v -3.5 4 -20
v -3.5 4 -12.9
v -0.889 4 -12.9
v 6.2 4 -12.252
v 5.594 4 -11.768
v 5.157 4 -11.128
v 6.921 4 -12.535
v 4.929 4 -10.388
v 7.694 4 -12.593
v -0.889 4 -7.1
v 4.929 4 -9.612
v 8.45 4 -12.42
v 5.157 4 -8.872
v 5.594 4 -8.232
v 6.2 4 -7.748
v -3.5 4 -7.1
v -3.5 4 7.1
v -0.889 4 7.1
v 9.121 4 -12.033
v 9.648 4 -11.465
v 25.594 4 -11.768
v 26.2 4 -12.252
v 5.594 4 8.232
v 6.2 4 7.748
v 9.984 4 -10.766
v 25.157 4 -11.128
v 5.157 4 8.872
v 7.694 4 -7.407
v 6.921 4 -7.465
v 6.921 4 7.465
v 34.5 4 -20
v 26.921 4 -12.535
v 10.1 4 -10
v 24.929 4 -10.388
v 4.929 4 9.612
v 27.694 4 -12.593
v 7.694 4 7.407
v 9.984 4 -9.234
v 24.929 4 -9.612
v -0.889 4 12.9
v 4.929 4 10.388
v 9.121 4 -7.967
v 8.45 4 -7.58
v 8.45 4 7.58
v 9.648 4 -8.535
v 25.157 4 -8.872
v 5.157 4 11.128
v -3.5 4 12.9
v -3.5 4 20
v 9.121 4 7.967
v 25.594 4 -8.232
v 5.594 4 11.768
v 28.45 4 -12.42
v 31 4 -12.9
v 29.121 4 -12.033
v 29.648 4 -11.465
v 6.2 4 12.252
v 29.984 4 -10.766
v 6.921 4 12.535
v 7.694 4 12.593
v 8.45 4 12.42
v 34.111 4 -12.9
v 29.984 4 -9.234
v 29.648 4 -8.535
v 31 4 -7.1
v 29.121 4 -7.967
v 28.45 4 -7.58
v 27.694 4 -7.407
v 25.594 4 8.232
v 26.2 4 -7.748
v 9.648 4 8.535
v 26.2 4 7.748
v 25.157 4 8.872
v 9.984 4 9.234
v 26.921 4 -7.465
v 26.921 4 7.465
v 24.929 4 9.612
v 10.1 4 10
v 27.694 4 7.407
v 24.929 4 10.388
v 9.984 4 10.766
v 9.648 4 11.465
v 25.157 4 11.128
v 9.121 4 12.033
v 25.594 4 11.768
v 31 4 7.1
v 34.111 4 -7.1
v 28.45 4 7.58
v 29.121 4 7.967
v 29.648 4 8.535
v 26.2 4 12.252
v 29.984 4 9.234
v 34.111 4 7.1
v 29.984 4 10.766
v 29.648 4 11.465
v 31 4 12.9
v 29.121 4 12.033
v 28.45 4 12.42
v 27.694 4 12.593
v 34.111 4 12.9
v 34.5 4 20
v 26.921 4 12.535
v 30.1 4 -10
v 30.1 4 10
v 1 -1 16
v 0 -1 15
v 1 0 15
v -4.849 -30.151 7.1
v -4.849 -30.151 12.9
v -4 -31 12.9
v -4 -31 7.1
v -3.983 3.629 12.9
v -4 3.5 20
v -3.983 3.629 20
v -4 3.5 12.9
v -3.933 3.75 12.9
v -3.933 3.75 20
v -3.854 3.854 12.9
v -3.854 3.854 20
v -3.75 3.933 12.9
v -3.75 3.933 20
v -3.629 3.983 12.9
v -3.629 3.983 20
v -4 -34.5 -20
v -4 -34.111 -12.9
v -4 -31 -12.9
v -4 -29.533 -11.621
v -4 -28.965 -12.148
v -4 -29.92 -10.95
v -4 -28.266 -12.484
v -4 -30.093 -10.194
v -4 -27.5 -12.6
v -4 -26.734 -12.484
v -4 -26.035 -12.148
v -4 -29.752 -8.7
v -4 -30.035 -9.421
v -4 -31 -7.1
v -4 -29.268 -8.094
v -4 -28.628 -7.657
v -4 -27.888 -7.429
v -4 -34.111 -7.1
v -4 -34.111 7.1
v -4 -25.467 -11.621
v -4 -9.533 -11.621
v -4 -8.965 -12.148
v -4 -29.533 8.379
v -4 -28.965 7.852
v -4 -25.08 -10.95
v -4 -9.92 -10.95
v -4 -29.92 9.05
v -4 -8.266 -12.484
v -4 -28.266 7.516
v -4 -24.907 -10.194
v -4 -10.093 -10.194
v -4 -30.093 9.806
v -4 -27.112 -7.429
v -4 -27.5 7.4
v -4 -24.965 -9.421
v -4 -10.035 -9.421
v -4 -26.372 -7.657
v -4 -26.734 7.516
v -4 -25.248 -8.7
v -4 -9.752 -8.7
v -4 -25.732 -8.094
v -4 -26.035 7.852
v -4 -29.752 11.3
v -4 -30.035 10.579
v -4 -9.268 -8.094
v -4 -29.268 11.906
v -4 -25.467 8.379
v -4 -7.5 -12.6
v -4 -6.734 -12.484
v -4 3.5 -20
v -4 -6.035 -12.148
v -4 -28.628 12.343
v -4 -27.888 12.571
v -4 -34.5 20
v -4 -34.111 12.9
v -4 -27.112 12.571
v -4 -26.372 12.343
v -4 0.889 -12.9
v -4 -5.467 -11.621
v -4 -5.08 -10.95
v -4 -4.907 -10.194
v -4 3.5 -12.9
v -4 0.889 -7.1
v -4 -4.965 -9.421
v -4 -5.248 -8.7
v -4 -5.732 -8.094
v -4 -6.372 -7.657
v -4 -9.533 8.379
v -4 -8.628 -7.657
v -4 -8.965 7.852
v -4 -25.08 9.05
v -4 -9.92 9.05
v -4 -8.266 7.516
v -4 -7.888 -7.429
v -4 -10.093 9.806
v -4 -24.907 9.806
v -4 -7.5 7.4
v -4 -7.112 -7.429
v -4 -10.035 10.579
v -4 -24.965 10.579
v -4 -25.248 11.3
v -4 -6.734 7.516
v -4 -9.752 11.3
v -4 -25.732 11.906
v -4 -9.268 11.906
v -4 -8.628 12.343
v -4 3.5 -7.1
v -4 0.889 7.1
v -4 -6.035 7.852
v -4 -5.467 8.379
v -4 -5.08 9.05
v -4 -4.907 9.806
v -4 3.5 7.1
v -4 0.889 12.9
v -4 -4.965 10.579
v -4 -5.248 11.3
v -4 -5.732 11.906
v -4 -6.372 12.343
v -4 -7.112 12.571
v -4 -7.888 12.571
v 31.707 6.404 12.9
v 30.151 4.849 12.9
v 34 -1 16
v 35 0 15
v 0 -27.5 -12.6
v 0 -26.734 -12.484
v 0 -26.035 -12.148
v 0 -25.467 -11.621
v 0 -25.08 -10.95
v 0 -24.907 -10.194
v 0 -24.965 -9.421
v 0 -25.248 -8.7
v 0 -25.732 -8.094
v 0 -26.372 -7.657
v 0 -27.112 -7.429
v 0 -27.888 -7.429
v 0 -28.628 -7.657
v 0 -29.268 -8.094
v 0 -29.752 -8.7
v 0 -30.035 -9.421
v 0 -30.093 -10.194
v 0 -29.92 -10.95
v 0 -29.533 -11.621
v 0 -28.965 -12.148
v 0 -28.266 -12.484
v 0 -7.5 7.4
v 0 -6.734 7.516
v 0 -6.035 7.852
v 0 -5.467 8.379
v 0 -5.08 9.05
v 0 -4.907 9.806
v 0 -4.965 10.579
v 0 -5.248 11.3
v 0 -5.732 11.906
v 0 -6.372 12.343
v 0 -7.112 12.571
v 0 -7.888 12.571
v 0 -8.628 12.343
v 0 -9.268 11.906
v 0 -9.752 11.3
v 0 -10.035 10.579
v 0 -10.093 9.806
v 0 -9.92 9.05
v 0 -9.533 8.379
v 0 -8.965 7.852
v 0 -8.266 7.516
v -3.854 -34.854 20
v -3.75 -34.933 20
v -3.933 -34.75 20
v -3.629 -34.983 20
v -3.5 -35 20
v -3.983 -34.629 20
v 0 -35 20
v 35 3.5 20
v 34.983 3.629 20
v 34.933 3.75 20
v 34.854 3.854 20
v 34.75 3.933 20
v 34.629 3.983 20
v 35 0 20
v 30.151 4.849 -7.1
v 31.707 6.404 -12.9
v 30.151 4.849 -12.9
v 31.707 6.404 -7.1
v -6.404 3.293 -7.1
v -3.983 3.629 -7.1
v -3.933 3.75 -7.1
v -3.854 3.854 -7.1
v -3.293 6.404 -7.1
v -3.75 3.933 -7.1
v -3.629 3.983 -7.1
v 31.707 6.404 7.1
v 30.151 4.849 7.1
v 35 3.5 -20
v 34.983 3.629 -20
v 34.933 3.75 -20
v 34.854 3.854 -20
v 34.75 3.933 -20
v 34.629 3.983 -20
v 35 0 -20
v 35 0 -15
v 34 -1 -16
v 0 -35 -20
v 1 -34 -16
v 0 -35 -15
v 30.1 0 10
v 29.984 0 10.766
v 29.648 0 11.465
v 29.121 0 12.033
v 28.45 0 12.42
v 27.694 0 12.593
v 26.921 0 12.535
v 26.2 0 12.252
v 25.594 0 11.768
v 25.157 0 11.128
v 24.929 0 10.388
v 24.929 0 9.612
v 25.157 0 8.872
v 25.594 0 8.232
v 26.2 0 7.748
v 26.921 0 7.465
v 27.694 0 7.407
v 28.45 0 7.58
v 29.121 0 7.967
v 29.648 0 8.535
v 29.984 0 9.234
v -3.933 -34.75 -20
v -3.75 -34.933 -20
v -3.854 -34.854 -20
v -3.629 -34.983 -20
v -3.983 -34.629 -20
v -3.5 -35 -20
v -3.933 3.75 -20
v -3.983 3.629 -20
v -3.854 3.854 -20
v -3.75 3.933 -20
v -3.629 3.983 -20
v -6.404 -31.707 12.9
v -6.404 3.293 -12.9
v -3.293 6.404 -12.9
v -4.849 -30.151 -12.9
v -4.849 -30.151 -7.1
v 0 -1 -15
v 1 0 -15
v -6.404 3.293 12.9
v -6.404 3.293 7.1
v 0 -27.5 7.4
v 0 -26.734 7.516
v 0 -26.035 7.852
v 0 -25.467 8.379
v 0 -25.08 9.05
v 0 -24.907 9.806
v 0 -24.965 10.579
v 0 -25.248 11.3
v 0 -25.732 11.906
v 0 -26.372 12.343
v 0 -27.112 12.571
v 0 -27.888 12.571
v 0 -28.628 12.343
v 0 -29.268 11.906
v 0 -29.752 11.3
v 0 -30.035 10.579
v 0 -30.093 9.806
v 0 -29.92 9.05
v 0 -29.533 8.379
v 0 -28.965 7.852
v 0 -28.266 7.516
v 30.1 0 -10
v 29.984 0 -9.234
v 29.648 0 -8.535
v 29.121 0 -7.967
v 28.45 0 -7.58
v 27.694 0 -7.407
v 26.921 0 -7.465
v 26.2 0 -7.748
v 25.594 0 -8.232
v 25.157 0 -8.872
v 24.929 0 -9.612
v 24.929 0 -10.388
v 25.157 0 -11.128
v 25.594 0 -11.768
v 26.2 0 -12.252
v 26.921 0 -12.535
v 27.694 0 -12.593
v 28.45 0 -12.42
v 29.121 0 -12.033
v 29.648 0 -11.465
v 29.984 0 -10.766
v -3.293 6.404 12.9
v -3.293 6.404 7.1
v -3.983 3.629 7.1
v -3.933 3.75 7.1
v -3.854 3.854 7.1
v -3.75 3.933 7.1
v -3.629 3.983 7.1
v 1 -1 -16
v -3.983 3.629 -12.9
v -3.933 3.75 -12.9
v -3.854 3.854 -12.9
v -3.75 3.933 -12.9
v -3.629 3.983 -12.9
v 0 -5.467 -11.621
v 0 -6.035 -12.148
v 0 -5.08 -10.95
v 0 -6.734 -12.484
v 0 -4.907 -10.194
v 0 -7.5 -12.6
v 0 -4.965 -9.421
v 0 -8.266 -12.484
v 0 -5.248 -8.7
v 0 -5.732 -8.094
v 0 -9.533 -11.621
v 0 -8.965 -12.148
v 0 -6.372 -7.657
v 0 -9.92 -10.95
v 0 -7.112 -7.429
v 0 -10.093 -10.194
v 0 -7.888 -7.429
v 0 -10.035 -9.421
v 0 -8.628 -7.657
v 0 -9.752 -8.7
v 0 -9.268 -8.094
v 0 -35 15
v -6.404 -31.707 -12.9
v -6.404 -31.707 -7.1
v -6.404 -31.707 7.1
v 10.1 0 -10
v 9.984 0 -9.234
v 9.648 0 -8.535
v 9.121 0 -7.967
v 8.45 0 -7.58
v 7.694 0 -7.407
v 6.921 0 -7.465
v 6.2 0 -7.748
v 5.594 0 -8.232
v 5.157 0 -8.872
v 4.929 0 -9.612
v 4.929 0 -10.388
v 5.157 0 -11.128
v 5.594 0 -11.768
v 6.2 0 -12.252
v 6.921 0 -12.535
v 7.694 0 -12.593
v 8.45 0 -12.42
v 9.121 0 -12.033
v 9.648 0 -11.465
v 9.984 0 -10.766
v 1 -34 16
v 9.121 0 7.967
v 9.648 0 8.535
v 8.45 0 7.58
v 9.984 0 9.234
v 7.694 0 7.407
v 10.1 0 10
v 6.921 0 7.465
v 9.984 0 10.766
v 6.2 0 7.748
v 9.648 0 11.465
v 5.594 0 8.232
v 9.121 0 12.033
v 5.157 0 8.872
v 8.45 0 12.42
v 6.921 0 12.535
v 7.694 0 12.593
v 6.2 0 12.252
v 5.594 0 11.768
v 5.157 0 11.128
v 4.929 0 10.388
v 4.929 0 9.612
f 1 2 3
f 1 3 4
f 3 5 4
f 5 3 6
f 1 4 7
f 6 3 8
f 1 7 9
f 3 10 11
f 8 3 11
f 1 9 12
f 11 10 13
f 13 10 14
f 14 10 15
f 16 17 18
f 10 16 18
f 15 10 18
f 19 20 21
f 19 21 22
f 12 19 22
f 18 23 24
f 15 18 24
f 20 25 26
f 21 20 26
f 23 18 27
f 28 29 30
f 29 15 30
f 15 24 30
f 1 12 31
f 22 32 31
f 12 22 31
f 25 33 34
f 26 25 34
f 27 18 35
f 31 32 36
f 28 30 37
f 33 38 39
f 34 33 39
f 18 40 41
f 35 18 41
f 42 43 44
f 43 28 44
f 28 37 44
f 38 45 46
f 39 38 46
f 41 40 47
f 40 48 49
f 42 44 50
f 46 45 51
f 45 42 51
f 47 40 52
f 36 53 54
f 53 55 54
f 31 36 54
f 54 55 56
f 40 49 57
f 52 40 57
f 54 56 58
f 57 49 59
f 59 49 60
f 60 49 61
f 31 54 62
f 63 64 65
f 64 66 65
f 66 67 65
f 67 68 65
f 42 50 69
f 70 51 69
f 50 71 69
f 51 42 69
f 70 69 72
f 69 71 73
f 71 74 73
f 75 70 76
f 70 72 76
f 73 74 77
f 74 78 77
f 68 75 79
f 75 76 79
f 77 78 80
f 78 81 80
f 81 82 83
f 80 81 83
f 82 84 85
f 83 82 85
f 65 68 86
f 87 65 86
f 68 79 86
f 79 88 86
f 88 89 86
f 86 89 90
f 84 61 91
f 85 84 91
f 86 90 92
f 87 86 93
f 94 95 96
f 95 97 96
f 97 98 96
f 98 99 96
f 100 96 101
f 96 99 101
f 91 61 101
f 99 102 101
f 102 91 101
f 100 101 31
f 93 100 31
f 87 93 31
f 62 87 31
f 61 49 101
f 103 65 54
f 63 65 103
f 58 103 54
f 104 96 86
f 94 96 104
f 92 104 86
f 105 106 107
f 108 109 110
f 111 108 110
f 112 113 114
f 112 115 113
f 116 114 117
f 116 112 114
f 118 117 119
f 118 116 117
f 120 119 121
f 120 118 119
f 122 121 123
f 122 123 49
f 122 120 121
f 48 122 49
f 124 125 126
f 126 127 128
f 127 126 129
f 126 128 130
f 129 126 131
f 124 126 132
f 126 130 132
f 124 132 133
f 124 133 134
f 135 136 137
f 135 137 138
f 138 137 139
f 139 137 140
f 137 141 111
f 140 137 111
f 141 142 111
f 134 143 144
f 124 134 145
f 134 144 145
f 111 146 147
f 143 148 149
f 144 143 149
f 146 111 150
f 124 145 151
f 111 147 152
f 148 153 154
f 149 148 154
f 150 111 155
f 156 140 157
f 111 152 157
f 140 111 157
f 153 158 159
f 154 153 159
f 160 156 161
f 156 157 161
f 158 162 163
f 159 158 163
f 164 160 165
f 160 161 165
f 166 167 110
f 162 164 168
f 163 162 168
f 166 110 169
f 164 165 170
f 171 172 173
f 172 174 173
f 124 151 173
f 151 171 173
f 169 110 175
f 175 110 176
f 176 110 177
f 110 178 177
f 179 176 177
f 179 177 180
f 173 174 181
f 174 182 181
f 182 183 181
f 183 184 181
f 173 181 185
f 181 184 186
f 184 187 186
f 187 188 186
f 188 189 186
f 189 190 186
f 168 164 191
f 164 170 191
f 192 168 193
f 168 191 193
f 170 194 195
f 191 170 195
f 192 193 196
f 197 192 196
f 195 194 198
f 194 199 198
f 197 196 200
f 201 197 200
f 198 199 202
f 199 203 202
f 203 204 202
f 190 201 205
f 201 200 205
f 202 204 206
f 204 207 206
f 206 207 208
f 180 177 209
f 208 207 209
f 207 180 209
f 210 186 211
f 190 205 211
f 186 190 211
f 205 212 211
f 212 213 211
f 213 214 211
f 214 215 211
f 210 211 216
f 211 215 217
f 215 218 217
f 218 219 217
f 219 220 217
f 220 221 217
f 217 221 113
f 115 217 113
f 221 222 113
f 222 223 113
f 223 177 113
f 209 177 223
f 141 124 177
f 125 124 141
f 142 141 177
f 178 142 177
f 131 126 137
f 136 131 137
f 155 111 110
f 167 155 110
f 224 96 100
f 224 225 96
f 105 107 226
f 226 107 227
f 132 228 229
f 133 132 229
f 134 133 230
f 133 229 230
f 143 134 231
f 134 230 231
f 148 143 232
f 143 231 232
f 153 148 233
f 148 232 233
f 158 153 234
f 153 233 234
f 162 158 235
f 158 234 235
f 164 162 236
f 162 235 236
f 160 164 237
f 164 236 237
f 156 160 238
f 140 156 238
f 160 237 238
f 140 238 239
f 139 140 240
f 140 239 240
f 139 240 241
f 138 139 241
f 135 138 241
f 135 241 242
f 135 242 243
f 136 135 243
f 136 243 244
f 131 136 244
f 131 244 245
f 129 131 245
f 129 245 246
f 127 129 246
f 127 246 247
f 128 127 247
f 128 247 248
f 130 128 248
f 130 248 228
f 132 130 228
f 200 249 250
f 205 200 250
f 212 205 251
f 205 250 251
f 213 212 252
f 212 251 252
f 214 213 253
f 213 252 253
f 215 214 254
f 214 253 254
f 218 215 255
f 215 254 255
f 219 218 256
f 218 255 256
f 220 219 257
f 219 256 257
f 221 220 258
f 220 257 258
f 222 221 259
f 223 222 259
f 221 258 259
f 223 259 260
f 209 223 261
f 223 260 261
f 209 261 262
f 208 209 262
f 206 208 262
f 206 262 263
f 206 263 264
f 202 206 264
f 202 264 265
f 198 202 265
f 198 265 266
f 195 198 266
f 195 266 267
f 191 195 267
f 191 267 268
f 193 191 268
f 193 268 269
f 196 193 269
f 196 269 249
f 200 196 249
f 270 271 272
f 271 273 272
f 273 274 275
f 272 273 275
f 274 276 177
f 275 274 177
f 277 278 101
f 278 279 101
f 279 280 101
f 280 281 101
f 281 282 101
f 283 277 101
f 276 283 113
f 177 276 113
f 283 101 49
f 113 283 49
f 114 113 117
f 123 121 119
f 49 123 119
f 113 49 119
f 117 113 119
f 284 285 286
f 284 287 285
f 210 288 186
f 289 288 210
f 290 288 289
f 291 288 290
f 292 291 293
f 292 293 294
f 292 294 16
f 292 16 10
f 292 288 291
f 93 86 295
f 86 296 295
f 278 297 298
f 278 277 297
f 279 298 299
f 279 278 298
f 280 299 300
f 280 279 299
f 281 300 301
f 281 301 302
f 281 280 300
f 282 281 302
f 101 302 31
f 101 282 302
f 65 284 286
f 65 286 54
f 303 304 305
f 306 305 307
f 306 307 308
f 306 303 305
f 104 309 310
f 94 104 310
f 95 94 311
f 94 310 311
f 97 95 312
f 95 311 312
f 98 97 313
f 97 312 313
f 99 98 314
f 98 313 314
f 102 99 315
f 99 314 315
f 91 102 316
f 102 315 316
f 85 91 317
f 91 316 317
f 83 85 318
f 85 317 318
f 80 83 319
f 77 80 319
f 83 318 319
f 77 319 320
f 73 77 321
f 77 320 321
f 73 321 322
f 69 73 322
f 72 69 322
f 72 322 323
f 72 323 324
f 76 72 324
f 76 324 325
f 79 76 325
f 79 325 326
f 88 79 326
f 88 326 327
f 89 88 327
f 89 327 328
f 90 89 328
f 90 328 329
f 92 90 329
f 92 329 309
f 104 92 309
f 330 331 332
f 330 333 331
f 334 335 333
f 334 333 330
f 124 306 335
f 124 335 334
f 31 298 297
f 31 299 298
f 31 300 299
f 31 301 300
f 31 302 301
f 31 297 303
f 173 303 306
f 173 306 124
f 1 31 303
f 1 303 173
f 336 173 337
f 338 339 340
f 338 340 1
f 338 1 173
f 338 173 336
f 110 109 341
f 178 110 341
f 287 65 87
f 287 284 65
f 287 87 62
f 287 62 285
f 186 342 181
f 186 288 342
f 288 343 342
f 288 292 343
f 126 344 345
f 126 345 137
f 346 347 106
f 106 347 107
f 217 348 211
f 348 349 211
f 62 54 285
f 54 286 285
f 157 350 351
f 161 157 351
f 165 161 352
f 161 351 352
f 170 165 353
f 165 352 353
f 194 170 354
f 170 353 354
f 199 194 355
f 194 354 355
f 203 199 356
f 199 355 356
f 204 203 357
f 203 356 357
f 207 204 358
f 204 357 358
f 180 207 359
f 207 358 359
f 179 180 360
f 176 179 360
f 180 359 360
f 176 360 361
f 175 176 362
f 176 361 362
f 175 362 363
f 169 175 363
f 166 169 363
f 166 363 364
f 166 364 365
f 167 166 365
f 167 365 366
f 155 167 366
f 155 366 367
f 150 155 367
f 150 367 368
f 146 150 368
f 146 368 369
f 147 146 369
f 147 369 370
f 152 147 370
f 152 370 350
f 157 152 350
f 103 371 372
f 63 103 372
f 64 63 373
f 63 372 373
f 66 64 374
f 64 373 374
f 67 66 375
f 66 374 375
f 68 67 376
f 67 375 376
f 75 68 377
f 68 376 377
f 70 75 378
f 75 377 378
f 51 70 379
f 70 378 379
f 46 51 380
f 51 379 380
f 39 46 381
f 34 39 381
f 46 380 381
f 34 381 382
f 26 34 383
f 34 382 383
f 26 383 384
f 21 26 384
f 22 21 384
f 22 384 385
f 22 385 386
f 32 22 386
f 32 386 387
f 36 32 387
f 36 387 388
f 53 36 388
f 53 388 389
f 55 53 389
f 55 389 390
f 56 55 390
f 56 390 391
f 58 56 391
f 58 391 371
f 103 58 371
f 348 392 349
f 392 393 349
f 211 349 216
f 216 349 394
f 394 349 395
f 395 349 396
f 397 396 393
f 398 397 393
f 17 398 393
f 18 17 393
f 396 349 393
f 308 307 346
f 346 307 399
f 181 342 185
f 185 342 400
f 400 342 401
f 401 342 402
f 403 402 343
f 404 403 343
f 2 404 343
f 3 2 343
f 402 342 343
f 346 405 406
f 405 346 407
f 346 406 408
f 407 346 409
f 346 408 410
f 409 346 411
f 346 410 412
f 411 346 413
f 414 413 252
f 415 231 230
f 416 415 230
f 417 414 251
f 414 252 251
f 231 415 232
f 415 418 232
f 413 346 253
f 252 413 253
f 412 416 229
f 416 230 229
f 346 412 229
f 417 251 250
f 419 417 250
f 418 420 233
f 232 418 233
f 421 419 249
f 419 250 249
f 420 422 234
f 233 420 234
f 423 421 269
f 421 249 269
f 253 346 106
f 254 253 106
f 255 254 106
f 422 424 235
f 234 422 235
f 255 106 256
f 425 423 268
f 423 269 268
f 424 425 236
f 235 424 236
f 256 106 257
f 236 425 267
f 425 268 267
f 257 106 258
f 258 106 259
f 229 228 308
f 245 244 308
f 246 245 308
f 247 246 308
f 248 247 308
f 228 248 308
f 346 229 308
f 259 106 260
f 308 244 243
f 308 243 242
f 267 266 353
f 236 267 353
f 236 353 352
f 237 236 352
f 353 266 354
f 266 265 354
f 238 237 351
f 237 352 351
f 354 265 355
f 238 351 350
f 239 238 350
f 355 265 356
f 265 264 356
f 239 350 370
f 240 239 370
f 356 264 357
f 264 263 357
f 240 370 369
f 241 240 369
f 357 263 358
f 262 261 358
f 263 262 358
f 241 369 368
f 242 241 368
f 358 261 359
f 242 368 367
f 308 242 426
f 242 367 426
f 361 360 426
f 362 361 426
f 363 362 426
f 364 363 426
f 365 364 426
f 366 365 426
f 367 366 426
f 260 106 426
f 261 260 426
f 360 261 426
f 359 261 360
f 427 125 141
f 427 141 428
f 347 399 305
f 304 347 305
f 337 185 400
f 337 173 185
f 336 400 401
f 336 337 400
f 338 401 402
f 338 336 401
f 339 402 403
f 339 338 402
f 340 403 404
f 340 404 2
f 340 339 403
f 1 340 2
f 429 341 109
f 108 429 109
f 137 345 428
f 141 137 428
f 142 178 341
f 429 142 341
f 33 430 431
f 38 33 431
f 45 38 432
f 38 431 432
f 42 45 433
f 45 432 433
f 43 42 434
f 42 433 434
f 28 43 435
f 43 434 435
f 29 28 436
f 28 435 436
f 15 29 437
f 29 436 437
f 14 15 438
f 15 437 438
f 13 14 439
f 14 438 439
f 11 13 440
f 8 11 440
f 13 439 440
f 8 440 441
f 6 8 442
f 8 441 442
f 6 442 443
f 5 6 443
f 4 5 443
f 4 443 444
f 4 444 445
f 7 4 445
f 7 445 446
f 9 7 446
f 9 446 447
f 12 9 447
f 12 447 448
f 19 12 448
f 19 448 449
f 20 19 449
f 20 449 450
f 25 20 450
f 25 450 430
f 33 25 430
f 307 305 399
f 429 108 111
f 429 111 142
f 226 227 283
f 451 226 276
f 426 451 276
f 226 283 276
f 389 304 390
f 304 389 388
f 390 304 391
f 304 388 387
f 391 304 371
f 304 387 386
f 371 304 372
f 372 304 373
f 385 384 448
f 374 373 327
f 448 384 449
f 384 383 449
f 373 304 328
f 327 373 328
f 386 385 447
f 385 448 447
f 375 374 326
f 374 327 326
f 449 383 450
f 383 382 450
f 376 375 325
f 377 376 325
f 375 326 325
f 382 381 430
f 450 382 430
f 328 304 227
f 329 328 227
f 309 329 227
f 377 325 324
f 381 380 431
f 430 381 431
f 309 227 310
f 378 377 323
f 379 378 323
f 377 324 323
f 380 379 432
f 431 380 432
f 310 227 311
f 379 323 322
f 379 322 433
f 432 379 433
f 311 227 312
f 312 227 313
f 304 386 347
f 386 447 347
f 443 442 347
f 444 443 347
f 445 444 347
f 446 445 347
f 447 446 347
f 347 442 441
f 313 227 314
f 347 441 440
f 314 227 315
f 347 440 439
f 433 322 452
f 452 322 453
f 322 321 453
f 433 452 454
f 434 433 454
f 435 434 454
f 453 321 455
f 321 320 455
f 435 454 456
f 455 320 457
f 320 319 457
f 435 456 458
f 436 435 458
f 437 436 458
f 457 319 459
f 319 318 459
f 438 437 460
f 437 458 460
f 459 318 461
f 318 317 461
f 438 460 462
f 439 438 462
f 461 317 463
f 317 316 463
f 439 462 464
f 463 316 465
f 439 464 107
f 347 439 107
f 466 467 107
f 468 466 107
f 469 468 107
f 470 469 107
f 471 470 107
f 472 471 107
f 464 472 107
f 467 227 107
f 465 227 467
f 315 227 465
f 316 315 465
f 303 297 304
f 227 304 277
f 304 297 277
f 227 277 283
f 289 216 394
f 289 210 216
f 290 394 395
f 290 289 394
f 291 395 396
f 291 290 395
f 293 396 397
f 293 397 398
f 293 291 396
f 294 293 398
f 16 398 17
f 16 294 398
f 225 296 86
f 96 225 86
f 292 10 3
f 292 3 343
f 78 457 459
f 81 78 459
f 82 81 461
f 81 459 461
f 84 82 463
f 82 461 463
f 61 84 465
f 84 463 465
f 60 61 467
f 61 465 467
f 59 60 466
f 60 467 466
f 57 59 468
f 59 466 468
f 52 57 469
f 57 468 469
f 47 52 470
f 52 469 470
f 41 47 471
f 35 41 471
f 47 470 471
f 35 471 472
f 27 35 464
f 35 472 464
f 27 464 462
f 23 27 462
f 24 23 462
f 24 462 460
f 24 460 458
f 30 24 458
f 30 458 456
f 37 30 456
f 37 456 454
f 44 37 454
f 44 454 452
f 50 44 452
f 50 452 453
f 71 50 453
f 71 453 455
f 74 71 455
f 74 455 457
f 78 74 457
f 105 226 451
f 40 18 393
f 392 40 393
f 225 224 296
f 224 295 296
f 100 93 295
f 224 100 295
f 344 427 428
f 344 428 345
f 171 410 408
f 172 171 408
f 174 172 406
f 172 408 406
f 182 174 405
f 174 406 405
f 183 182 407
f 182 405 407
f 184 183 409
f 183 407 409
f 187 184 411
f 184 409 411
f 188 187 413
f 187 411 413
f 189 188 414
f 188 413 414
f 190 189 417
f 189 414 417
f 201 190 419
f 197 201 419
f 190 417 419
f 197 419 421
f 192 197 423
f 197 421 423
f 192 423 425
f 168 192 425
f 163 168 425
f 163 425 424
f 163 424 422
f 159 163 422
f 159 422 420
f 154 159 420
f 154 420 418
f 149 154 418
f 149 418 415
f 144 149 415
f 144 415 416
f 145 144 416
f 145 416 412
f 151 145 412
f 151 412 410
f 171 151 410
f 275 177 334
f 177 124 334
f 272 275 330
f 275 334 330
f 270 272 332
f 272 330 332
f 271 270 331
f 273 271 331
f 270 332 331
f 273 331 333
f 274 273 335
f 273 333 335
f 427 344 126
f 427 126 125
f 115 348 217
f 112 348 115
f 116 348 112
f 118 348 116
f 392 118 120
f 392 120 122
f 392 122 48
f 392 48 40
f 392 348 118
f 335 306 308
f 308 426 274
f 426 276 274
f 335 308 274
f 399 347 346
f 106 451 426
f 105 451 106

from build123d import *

# Parameters (mm, degrees)
EXTRUDE_1_DEPTH     = 20
EXTRUDE_2_DEPTH     = 4
SKETCH_3_R          = 2.6
CUT_EXTRUDE_1_DEPTH = 54.38539126
SKETCH_4_R          = 2.6
CUT_EXTRUDE_2_DEPTH = 54.38539126
EXTRUDE_START       = -10
EXTRUDE_3_DEPTH     = 2.9
FILLET_1_R          = 0.5
CHAMFER_1_SIZE      = 1


with BuildPart() as part:
    # Эскиз1 → Бобышка-Вытянуть1 (new, symmetric)
    with BuildSketch(Plane.XY):
        Polygon((0, 0), (0, -35), (-4, -35), (-4, 4), (35, 4), (35, 0), align=None)
    extrude(amount=EXTRUDE_1_DEPTH, both=True)

    # Эскиз2 → Бобышка-Вытянуть2 (add)
    with BuildSketch(Plane.XY.offset(20)):
        Polygon((0, -35), (0, 0), (35, 0), align=None)
    extrude_2 = extrude(amount=-EXTRUDE_2_DEPTH)

    # Зеркальное отражение1: Бобышка-Вытянуть2 across plane
    add(extrude_2.mirror(Plane.XY))

    # Эскиз3 → Вырез-Вытянуть1 (cut, through all)
    with BuildSketch(Plane(origin=(0, 0, 0), x_dir=(0, 0, -1), z_dir=(1, 0, 0))):
        with Locations((-10, -27.5)):
            Circle(SKETCH_3_R)
        with Locations((10, -27.5)):
            Circle(SKETCH_3_R)
        with Locations((10, -7.5)):
            Circle(SKETCH_3_R)
        with Locations((-10, -7.5)):
            Circle(SKETCH_3_R)
    extrude(amount=-CUT_EXTRUDE_1_DEPTH, mode=Mode.SUBTRACT)

    # Эскиз4 → Вырез-Вытянуть2 (cut, through all)
    with BuildSketch(Plane.XZ):
        with Locations((27.5, -10)):
            Circle(SKETCH_4_R)
        with Locations((7.5, -10)):
            Circle(SKETCH_4_R)
        with Locations((7.5, 10)):
            Circle(SKETCH_4_R)
        with Locations((27.5, 10)):
            Circle(SKETCH_4_R)
    extrude(amount=-CUT_EXTRUDE_2_DEPTH, mode=Mode.SUBTRACT)

    # Эскиз5 → Бобышка-Вытянуть3 (add, symmetric)
    with BuildSketch(Plane.XY.offset(20).offset(EXTRUDE_START)):
        Polygon((-0.888730163, 4), (-3.292893219, 6.404163056), (-6.404163056, 3.292893219), (-4, 0.888730163), (-4, 4), align=None)
        Polygon((35, 3.111269837), (31.707106781, 6.404163056), (30.151471863, 4.848528137), (35, 0), align=None)
        Polygon((-4.848528137, -30.151471863), (0, -35), (-3.111269837, -35), (-6.404163056, -31.707106781), align=None)
    extrude_3 = extrude(amount=EXTRUDE_3_DEPTH, both=True)

    # Зеркальное отражение2: Бобышка-Вытянуть3 across plane
    add(extrude_3.mirror(Plane.XY))

    # Скругление1
    fillet_1_edges = [part.edges().sort_by_distance(p)[0] for p in [
        (-4, -35, 0),
        (-4, 4, 16.45),
        (35, 4, 0),
        (-4, 4, -16.45),
        (-4, 4, 0),
    ]]
    fillet(fillet_1_edges, radius=FILLET_1_R)

    # Фаска1
    chamfer_1_edges = [part.edges().sort_by_distance(p)[0] for p in [
        (0, 0, 0),
        (0, -17.5, 16),
        (17.5, 0, 16),
        (17.5, 0, -16),
        (0, -17.5, -16),
    ]]
    chamfer(chamfer_1_edges, length=CHAMFER_1_SIZE)


solid = part.part
